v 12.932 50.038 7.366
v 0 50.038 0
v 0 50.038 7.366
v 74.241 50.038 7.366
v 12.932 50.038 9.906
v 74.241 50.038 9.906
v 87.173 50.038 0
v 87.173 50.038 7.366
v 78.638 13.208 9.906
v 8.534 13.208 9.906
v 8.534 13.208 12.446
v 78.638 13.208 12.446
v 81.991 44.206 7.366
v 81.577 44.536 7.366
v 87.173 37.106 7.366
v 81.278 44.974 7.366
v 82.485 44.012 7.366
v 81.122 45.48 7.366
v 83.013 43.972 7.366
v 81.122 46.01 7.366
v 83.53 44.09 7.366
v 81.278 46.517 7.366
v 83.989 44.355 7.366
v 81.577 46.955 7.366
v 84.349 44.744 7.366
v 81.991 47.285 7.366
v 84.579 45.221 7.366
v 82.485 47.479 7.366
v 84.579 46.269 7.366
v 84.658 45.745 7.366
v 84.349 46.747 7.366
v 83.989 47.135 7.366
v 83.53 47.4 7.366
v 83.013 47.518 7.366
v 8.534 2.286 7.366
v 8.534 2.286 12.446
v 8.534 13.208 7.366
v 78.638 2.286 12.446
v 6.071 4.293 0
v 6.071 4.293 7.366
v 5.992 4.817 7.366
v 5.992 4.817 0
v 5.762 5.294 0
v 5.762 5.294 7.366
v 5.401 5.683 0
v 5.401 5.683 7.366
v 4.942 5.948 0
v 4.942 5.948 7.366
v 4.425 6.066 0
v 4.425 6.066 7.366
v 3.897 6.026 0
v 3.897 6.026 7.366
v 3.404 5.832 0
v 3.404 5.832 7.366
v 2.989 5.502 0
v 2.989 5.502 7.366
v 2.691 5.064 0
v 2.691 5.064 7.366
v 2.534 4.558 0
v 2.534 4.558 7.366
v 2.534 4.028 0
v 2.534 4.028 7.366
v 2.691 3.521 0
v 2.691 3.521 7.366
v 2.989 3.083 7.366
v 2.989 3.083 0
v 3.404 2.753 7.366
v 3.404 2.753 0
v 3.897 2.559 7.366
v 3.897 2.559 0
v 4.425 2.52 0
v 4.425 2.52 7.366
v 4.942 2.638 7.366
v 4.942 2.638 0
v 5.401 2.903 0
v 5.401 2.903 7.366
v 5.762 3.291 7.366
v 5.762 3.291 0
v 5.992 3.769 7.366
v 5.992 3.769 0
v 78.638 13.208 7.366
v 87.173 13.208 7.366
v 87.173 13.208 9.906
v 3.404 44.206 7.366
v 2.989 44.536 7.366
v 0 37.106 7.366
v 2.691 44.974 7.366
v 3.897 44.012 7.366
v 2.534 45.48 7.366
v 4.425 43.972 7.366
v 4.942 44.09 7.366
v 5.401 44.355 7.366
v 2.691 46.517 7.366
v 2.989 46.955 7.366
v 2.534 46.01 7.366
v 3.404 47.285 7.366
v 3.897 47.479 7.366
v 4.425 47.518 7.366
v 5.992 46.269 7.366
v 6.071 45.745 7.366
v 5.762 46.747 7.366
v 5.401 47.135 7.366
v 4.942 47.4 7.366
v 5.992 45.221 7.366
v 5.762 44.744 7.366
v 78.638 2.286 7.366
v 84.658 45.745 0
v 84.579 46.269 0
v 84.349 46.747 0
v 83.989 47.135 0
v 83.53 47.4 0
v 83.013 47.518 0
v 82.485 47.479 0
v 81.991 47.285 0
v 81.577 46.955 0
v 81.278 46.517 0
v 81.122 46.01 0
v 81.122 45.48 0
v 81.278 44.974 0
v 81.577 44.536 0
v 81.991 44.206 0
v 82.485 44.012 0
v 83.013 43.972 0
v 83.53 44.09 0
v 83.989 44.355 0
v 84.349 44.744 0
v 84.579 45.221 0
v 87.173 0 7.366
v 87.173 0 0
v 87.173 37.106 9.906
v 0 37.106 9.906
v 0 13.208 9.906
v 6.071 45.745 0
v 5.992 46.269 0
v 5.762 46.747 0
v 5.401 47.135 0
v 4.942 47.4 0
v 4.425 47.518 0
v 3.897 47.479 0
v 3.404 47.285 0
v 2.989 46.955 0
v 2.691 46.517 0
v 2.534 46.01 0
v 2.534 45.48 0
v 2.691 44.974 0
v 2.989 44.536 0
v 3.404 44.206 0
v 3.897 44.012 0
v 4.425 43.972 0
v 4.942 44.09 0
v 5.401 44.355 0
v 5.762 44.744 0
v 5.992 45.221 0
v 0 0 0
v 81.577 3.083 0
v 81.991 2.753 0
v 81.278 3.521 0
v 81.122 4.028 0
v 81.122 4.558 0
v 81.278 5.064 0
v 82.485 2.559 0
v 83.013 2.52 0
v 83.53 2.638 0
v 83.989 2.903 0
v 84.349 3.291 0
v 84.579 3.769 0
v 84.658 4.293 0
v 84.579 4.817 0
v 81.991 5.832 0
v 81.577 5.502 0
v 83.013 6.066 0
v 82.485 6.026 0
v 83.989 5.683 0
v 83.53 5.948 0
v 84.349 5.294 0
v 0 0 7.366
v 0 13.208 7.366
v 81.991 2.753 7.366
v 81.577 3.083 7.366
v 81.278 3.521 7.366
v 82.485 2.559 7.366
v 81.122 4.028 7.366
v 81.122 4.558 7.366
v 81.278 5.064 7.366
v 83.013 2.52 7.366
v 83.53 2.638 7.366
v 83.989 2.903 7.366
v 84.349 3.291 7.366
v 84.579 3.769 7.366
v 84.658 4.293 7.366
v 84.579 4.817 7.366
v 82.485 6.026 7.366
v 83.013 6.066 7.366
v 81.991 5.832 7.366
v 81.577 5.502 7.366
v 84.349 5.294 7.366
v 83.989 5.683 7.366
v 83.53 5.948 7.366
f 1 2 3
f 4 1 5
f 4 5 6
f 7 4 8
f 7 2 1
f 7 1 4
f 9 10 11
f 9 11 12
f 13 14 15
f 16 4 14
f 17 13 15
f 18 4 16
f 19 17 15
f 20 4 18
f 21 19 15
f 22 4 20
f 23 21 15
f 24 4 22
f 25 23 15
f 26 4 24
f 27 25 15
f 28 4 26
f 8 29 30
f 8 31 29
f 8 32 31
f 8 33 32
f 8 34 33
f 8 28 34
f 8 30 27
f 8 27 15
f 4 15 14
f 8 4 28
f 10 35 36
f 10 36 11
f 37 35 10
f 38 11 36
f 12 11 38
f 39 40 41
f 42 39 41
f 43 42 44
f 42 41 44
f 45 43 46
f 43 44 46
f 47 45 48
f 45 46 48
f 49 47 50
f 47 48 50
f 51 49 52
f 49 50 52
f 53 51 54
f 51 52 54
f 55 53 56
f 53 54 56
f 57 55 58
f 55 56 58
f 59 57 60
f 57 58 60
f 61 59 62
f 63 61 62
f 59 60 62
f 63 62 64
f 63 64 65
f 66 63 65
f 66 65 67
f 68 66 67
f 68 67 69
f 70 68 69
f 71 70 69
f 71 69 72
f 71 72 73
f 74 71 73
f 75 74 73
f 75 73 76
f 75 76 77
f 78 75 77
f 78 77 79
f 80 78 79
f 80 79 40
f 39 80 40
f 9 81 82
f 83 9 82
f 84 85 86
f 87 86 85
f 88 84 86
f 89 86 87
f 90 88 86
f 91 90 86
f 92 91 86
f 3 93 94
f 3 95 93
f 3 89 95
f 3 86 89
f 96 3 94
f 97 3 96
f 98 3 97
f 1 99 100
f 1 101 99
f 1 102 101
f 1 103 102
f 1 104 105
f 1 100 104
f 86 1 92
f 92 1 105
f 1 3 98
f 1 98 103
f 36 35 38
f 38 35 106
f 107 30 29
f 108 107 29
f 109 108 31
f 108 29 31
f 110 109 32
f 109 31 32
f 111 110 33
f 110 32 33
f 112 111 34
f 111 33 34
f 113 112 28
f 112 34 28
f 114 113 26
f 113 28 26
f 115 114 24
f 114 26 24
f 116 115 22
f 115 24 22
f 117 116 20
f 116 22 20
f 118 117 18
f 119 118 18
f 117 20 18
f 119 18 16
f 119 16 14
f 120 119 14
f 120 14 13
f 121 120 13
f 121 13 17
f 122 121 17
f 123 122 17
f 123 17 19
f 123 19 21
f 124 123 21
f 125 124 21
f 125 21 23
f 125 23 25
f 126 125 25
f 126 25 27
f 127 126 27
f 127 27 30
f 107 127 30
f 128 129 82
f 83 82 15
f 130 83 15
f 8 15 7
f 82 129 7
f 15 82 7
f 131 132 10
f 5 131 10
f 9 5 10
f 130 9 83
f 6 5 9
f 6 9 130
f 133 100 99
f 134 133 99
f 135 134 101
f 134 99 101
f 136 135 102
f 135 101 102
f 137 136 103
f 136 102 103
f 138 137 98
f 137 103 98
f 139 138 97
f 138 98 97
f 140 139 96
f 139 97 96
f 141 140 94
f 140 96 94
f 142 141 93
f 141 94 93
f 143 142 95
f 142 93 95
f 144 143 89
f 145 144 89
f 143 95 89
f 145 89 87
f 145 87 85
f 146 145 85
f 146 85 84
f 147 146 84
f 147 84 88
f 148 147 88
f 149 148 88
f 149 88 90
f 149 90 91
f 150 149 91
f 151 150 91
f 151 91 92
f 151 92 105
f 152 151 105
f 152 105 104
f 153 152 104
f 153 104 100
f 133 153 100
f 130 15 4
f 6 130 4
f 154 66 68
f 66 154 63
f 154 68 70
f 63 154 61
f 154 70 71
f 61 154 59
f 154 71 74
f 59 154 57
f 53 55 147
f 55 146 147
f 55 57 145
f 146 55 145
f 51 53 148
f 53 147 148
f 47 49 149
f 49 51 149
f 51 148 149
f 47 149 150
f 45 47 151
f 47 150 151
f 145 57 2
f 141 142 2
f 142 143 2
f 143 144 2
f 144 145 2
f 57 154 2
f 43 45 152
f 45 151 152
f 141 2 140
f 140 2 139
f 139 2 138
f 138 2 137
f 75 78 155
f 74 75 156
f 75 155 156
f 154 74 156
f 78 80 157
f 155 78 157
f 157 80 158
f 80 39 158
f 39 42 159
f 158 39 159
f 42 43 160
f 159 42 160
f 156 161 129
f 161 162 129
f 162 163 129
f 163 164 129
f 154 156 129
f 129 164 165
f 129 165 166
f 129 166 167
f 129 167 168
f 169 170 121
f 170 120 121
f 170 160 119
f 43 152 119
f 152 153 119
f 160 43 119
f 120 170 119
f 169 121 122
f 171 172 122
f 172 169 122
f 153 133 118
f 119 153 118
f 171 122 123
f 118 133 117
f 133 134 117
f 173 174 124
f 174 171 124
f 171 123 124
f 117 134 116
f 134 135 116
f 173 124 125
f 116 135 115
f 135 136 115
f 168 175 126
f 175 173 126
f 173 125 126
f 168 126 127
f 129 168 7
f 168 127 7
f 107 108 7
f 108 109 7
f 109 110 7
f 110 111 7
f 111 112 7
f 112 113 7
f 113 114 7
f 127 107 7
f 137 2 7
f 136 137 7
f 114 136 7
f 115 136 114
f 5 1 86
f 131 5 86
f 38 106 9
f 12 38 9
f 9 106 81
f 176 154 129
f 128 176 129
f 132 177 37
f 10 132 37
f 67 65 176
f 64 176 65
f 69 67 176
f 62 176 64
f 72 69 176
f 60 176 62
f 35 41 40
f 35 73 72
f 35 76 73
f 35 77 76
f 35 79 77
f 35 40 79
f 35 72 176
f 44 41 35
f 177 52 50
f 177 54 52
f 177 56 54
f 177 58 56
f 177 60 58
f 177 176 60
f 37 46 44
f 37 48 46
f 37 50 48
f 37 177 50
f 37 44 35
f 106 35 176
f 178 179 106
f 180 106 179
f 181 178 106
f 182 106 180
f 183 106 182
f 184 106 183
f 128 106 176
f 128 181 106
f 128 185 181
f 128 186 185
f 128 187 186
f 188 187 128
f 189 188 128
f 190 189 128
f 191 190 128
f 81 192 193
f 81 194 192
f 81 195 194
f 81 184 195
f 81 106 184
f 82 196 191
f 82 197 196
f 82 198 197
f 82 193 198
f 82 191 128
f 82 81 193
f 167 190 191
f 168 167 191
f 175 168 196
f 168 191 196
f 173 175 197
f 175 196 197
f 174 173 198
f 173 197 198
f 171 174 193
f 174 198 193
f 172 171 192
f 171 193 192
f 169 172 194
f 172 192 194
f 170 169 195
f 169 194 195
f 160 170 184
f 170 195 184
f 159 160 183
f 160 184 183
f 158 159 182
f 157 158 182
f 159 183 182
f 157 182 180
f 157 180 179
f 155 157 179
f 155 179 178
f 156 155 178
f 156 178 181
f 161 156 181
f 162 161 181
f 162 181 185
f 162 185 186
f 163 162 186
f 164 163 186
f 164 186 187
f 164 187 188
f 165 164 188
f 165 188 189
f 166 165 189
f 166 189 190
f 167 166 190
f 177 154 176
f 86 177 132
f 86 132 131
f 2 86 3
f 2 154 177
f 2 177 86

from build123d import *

# Parameters (mm, degrees)
F0_W     = 87.1728
F0_H     = 50.038
F1_DEPTH = 7.366
F3_DEPTH = 2.54
F4_W     = 70.104
F4_H     = 10.922
F5_DEPTH = 5.08
F6_R     = 1.778
F7_DEPTH = 7.367


with BuildPart() as f1:
    # F0 (on Top) → F1 (new body)
    with BuildSketch(Plane.XY):
        with Locations((43.5864, 25.019)):
            Rectangle(F0_W, F0_H)
    extrude(amount=F1_DEPTH)

    # F2 (on face) → F3 (join)
    with BuildSketch(Plane.XY.offset(7.366)):
        Polygon((0, 37.106431), (0, 13.208), (87.1728, 13.208), (87.1728, 37.106431), (74.241231, 50.038), (12.931569, 50.038), align=None)
    extrude(amount=F3_DEPTH)

    # F4 (on face) → F5 (join)
    with BuildSketch(Plane.XY.offset(7.366)):
        with Locations((43.5864, 7.747)):
            Rectangle(F4_W, F4_H)
    extrude(amount=F5_DEPTH)

    # F6 (on face) → F7 (cut, through all)
    with BuildSketch(Plane.XY.offset(7.366)):
        with Locations((4.2926, 45.7454)):
            Circle(F6_R)
        with Locations((4.2926, 4.2926)):
            Circle(F6_R)
        with Locations((82.8802, 4.2926)):
            Circle(F6_R)
        with Locations((82.8802, 45.7454)):
            Circle(F6_R)
    extrude(amount=-F7_DEPTH, mode=Mode.SUBTRACT)


solid = f1.part
